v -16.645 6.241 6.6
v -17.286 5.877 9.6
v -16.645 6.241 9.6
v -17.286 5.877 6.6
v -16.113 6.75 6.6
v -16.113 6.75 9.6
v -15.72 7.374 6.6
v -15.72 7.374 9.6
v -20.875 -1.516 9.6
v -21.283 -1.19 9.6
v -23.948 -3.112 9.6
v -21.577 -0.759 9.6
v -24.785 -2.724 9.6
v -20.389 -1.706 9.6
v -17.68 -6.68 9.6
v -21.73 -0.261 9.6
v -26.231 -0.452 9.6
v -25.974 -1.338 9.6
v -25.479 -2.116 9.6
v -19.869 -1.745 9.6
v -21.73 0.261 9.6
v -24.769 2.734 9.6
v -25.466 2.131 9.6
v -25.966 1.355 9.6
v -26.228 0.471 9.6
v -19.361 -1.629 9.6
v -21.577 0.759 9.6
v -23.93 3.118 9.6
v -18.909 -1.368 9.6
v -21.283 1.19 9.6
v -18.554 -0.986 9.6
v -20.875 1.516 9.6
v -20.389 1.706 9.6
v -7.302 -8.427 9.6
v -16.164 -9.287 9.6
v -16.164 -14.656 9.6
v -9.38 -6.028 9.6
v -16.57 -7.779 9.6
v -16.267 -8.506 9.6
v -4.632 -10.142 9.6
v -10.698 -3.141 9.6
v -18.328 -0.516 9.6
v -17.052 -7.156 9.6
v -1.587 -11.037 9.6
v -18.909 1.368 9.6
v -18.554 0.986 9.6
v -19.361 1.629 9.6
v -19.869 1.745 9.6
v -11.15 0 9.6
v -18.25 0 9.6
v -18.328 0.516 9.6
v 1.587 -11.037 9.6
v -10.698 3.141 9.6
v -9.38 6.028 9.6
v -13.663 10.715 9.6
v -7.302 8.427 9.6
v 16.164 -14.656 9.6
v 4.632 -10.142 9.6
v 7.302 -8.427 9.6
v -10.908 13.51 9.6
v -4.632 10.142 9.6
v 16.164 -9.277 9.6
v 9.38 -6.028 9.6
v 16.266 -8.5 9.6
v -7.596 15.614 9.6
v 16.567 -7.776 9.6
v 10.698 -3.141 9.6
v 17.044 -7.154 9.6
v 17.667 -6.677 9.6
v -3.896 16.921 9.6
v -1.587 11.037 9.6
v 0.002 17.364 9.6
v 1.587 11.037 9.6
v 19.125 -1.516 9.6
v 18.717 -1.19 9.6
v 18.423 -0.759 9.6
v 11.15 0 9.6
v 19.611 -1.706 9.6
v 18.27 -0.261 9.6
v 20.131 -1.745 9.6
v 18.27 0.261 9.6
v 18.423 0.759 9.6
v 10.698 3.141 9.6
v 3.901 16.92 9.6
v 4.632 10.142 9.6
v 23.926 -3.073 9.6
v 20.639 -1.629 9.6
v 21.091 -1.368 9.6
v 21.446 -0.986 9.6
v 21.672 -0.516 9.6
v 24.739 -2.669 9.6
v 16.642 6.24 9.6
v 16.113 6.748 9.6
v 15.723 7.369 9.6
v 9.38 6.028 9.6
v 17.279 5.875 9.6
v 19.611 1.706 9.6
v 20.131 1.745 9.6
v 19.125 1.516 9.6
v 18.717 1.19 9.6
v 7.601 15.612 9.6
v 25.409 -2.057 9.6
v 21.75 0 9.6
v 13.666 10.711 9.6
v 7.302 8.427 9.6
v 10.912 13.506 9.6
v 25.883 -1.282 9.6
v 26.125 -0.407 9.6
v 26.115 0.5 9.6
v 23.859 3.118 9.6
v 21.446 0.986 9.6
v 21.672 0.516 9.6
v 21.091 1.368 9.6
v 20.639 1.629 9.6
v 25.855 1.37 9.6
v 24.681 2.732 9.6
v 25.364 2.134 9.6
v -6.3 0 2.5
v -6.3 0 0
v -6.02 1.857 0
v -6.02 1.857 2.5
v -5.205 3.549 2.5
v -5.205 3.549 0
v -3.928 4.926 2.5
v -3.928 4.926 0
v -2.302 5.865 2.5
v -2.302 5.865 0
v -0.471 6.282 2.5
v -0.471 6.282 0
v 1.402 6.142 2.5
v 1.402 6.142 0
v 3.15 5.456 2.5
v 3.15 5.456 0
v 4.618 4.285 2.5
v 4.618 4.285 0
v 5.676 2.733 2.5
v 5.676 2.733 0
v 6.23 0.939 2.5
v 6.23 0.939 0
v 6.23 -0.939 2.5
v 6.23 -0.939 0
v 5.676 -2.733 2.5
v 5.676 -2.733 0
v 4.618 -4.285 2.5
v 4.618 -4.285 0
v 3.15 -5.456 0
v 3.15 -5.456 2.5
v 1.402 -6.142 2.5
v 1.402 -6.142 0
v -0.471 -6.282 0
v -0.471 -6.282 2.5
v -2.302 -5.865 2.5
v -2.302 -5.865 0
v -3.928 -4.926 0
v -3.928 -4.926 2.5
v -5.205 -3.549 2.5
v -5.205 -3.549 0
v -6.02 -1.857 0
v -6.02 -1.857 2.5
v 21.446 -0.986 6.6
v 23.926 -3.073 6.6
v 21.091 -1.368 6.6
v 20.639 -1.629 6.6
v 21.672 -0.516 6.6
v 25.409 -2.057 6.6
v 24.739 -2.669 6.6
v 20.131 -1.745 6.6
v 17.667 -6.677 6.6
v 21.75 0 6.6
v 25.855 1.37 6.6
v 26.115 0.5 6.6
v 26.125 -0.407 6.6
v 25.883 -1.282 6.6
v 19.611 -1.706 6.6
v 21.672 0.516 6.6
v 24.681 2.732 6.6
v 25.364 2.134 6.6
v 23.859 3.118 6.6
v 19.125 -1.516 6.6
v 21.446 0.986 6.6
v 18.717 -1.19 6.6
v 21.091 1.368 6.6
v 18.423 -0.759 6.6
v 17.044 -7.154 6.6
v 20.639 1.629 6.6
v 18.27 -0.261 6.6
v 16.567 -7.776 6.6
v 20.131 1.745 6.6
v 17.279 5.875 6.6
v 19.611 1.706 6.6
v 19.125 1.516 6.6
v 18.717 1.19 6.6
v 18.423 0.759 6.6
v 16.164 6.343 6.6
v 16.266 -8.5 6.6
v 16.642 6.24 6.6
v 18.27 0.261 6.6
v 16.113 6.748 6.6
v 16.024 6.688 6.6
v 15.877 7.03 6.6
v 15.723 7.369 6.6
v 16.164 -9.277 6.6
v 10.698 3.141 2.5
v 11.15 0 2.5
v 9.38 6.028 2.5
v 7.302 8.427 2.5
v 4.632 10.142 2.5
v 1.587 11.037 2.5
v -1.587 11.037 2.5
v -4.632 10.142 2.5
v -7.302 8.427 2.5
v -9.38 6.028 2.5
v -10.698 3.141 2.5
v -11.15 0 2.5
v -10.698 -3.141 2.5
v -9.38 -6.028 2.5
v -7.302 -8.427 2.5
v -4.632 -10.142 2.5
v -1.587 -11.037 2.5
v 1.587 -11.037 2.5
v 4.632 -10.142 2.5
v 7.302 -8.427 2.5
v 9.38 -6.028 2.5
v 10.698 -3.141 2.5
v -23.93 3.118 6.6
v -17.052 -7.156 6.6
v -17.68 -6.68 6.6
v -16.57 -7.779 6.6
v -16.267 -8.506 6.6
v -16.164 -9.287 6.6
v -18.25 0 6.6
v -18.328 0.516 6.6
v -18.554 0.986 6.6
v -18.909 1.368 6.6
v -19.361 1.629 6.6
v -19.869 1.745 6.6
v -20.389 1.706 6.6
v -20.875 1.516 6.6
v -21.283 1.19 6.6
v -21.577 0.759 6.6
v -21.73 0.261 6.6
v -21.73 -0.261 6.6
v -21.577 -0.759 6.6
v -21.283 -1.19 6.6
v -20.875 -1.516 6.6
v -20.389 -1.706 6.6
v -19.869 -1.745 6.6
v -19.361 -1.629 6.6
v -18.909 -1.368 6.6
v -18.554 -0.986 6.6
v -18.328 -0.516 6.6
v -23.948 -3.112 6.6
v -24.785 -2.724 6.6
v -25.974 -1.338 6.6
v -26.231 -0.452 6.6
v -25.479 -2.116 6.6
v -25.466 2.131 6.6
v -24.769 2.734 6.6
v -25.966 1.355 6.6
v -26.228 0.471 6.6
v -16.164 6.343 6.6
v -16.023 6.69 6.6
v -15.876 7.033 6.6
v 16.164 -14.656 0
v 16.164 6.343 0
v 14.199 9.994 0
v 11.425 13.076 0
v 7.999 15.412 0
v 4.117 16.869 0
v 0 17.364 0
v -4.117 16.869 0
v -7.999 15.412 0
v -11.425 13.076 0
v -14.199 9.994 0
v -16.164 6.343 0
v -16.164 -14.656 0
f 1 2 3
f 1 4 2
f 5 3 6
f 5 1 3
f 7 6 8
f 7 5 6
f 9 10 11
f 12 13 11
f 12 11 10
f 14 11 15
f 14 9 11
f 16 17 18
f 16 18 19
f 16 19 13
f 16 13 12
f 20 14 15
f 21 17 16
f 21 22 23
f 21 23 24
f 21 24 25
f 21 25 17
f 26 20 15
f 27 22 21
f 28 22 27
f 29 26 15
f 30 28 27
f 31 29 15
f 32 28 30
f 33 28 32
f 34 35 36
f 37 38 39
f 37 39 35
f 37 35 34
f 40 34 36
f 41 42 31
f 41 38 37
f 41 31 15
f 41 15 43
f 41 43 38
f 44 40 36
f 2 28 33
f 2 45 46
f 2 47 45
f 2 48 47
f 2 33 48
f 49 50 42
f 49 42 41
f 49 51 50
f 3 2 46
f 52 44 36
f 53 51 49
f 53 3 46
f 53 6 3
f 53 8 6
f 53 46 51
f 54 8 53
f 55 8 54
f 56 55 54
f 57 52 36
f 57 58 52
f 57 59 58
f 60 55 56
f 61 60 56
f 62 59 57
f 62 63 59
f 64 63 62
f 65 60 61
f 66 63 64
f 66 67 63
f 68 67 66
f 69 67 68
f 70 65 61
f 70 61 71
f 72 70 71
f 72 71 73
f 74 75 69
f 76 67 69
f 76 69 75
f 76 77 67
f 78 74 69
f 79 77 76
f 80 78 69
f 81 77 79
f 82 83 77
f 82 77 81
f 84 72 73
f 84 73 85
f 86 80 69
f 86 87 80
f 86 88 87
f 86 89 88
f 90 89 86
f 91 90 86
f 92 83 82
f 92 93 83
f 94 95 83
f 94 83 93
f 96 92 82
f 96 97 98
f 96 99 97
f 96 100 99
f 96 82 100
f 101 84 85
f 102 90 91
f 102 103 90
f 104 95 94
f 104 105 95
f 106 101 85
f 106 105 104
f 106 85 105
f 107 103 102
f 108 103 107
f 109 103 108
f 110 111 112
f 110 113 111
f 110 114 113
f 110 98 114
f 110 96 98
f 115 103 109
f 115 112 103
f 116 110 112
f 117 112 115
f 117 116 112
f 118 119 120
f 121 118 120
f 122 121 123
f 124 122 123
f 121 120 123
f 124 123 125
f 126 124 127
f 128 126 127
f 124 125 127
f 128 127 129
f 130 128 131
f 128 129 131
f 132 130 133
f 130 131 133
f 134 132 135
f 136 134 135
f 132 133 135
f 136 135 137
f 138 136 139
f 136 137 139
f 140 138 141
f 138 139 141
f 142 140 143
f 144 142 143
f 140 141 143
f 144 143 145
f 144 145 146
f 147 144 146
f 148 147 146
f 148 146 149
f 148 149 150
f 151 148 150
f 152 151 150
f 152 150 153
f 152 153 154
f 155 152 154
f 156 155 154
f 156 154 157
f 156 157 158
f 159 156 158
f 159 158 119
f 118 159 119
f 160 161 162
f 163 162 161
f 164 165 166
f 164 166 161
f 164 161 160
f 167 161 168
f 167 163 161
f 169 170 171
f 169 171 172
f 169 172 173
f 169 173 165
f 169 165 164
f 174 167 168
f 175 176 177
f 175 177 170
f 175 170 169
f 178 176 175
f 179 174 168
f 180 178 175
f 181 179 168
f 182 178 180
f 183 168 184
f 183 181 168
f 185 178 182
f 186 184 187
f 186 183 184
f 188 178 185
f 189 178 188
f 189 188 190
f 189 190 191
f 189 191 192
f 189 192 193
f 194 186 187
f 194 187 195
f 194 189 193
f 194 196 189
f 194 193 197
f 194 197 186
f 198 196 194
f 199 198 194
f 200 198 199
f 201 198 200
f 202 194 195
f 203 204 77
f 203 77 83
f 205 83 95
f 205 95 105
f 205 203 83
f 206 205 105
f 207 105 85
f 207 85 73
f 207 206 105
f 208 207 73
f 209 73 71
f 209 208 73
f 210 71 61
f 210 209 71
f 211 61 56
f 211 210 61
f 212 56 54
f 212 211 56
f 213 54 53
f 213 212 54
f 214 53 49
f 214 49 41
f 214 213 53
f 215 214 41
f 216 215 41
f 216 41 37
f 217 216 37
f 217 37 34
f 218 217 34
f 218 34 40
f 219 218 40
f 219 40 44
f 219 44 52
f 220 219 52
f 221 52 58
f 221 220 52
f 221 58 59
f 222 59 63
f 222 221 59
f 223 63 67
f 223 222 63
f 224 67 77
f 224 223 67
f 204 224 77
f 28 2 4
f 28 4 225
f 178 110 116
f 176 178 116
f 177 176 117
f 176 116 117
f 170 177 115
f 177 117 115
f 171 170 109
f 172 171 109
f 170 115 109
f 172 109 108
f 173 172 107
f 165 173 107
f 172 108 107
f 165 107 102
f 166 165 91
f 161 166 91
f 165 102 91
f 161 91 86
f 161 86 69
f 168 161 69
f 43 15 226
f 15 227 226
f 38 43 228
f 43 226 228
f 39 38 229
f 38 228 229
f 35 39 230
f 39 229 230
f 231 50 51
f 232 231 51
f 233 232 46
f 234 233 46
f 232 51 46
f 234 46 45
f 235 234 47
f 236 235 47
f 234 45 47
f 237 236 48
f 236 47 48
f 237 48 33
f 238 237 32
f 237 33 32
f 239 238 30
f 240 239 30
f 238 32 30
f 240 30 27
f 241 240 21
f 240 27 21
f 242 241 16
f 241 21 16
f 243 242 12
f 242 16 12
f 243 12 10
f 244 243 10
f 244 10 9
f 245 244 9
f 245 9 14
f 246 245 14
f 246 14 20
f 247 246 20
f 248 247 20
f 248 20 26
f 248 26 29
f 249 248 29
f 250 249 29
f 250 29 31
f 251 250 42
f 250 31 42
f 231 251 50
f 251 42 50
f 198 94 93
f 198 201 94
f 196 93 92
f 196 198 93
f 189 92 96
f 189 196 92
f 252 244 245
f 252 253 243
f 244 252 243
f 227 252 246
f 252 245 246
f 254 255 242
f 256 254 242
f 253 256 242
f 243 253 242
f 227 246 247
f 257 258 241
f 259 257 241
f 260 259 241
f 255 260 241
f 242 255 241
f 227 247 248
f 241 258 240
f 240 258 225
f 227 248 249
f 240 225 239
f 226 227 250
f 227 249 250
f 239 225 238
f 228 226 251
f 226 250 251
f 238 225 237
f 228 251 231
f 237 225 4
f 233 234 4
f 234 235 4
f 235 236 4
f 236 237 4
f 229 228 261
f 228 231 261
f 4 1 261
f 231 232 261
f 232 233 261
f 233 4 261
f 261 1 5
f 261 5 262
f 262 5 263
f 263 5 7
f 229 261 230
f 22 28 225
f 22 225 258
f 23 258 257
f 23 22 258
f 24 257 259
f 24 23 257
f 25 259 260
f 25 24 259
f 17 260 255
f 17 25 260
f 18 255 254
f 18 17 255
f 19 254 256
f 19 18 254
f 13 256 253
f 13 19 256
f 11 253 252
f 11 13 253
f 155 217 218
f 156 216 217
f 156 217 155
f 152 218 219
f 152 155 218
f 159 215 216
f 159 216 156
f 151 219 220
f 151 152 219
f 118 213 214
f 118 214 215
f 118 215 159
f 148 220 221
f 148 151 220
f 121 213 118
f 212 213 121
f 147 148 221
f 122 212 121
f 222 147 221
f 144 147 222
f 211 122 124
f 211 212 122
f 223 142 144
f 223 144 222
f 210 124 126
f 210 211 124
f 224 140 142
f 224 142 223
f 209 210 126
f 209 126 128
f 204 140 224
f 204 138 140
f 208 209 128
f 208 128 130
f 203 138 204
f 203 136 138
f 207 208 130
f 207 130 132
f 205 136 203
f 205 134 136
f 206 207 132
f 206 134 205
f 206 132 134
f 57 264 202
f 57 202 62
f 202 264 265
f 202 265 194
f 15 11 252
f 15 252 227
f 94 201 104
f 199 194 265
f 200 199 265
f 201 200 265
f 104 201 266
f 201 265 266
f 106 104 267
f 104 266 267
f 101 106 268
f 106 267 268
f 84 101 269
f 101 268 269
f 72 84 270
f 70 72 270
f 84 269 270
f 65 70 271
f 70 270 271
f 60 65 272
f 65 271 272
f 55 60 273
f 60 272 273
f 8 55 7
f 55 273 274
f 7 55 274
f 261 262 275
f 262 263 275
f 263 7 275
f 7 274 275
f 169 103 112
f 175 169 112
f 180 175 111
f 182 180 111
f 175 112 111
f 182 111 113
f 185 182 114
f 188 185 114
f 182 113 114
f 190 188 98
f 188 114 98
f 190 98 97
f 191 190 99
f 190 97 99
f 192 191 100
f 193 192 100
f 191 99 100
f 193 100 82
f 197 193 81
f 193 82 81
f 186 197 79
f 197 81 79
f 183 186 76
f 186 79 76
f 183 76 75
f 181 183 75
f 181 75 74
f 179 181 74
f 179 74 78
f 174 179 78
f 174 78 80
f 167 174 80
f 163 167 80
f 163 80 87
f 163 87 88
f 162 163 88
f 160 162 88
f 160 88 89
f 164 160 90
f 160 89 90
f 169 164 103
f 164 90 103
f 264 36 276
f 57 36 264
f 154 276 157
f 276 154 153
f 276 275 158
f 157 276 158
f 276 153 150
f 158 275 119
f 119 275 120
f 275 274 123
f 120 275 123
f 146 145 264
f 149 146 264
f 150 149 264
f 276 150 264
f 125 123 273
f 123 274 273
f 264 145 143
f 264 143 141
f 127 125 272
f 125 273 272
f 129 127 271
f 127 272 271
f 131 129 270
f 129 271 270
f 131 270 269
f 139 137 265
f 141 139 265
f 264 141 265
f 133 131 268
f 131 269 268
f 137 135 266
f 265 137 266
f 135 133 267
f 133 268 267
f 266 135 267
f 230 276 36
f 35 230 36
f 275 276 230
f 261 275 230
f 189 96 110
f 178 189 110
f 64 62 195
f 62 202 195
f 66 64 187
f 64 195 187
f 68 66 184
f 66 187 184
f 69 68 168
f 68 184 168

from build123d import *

# Parameters (mm, degrees)
BOSS_EXTRUDE1_DEPTH = 2.5
BOSS_EXTRUDE2_DEPTH = 7.1
SKETCH6_R           = 1.7500000000000002
BOSS_EXTRUDE3_DEPTH = 3
FILLET1_R           = 3
CUT_EXTRUDE2_REACH  = 36.039
SKETCH7_R           = 6.300000000000017
CUT_EXTRUDE5_DEPTH  = 35.03920514623224
SKETCH9_R           = 11.15
BOSS_EXTRUDE4_DEPTH = 7.1
SKETCH10_W          = 32.327700987119805
SKETCH10_H          = 9.6
BOSS_EXTRUDE5_DEPTH = 2


with BuildPart() as part:
    # Sketch2 → Boss-Extrude1 (new body)
    with BuildSketch(Plane.XY):
        with BuildLine():
            Line((-16.1638504935599, 6.342967853027763), (-16.1638504935599, -14.391495343403756))
            Line((-16.1638504935599, -14.391495343403756), (-14.353897968517204, -14.640433541189916))
            Line((-14.353897968517204, -14.640433541189916), (-10.527602773342224, -17.52375378240297))
            Line((-10.527602773342224, -17.52375378240297), (-10.527602773341918, -19.404011272479938))
            Line((-10.527602773341918, -19.404011272479938), (-5.00712834909531, -19.40401127247995))
            Line((-5.00712834909531, -19.40401127247995), (-5.00712834909531, -17.50759675782326))
            Line((-5.00712834909531, -17.50759675782326), (5.000000000000001, -17.50759675782326))
            Line((5.000000000000001, -17.50759675782326), (5.000000000000002, -19.411447251383162))
            Line((5.000000000000002, -19.411447251383162), (10.46723706743368, -19.411447251383162))
            Line((10.46723706743368, -19.411447251383162), (10.46723706743368, -17.567178369014574))
            Line((10.46723706743368, -17.567178369014574), (14.33922382003656, -14.649427069646295))
            Line((14.33922382003656, -14.649427069646295), (16.163850493559902, -14.424396196711085))
            Line((16.163850493559902, -14.424396196711085), (16.163850493559902, 6.3429678530277736))
            ThreePointArc((16.163850493559902, 6.3429678530277736), (11.492625638566038, 13.016253681243118), (4.292170886786073, 16.82499845590859))
            ThreePointArc((4.292170886786073, 16.82499845590859), (-5.6e-16, 17.363850493559898), (-4.292170886786075, 16.824998455908585))
            ThreePointArc((-4.292170886786075, 16.824998455908585), (-11.492625638566041, 13.016253681243107), (-16.1638504935599, 6.342967853027763))
        make_face()
    extrude(amount=BOSS_EXTRUDE1_DEPTH)

    # Sketch3 → Boss-Extrude2 (add)
    with BuildSketch(Plane.XY.offset(2.5)):
        with BuildLine():
            Line((-16.163850493559902, 6.342967853027761), (-16.1638504935599, -14.391495343403756))
            Line((-16.1638504935599, -14.391495343403756), (-14.353897968517204, -14.640433541189916))
            Line((-14.353897968517204, -14.640433541189916), (-10.527602773342224, -17.52375378240297))
            Line((-10.527602773342224, -17.52375378240297), (-10.527602773341918, -19.404011272479938))
            Line((-10.527602773341918, -19.404011272479938), (-5.00712834909531, -19.40401127247995))
            Line((-5.00712834909531, -19.40401127247995), (-5.00712834909531, -17.50759675782326))
            Line((-5.00712834909531, -17.50759675782326), (5.000000000000001, -17.50759675782326))
            Line((5.000000000000001, -17.50759675782326), (5.000000000000002, -19.411447251383162))
            Line((5.000000000000002, -19.411447251383162), (10.46723706743368, -19.411447251383162))
            Line((10.46723706743368, -19.411447251383162), (10.46723706743368, -17.567178369014574))
            Line((10.46723706743368, -17.567178369014574), (14.33922382003656, -14.649427069646295))
            Line((14.33922382003656, -14.649427069646295), (16.163850493559902, -14.424396196711085))
            Line((16.163850493559902, -14.424396196711085), (16.1638504935599, 6.342967853027773))
            ThreePointArc((16.1638504935599, 6.342967853027773), (-6.65e-15, 17.363850493559898), (-16.163850493559902, 6.342967853027761))
        make_face()
        with BuildLine():
            Line((-14.363850493559898, 5.992765737499147), (-14.363850493559898, -12.822119287624734))
            Line((-14.363850493559898, -12.822119287624734), (-13.644664568054253, -12.921035057895738))
            Line((-13.644664568054253, -12.921035057895738), (-8.72760277334237, -16.626306887906704))
            Line((-8.72760277334237, -16.626306887906704), (-8.72760277334221, -17.60401127247994))
            Line((-8.72760277334221, -17.60401127247994), (-6.80712834909531, -17.604011272479944))
            Line((-6.80712834909531, -17.604011272479944), (-6.80712834909531, -15.707596757823262))
            Line((-6.80712834909531, -15.707596757823262), (6.800000000000001, -15.707596757823262))
            Line((6.800000000000001, -15.707596757823262), (6.800000000000002, -17.611447251383158))
            Line((6.800000000000002, -17.611447251383158), (8.667237067433682, -17.611447251383158))
            Line((8.667237067433682, -17.611447251383158), (8.667237067433682, -16.6697314745184))
            Line((8.667237067433682, -16.6697314745184), (13.640731753403138, -12.921934410741372))
            Line((13.640731753403138, -12.921934410741372), (14.3638504935599, -12.832752309167102))
            Line((14.3638504935599, -12.832752309167102), (14.3638504935599, 5.99276573749915))
            ThreePointArc((14.3638504935599, 5.99276573749915), (10.460467666070398, 11.524411411997598), (4.577751284666915, 14.875403704155904))
            ThreePointArc((4.577751284666915, 14.875403704155904), (-2.56e-15, 15.563850493559903), (-4.577751284666914, 14.8754037041559))
            ThreePointArc((-4.577751284666914, 14.8754037041559), (-10.460467666070397, 11.524411411997596), (-14.363850493559898, 5.992765737499147))
        make_face(mode=Mode.SUBTRACT)
    extrude(amount=BOSS_EXTRUDE2_DEPTH)

    # Sketch6 → Boss-Extrude3 (add)
    # profile 1 of 2: a face of its own
    with BuildSketch(Plane.XY.offset(9.6)):
        with BuildLine():
            Line((-16.163850493559902, -7.542701658313458), (-16.163850493559902, 6.342967853027761))
            Line((-16.163850493559902, 6.342967853027761), (-23.929756214170595, 3.117786469903069))
            ThreePointArc((-23.929756214170595, 3.117786469903069), (-26.262186338368657, 0.00976998259598626), (-23.948484603893608, -3.1122135300969274))
            Line((-23.948484603893608, -3.1122135300969274), (-16.163850493559902, -7.542701658313458))
        make_face()
        with Locations((-20, 0)):
            Circle(SKETCH6_R, mode=Mode.SUBTRACT)
    # profile 2 of 2: a face of its own
    with BuildSketch(Plane.XY.offset(9.6)):
        with BuildLine():
            Line((16.163850493559902, -7.542701658313497), (16.163850493559902, 6.3429678530277736))
            Line((16.163850493559902, 6.3429678530277736), (23.859195056542305, 3.1177864699030087))
            ThreePointArc((23.859195056542305, 3.1177864699030087), (26.152039317100943, 0.04687299892404297), (23.92587050194897, -3.072712992175038))
            Line((23.92587050194897, -3.072712992175038), (16.163850493559902, -7.542701658313497))
        make_face()
        with Locations((20, 0)):
            Circle(SKETCH6_R, mode=Mode.SUBTRACT)
    extrude(amount=-BOSS_EXTRUDE3_DEPTH)

    # Fillet1
    fillet1_edges = [part.edges().sort_by_distance(p)[0] for p in [
        (16.163850493559902, -7.542701658313497, 8.1),
        (-16.163850493559902, -7.542701658313458, 8.1),
        (16.1638504935599, 6.342967853027773, 8.1),
        (-16.163850493559902, 6.342967853027762, 8.1),
    ]]
    fillet(fillet1_edges, radius=FILLET1_R)

    # Sketch7 → Cut-Extrude2 (cut, up to next)
    with BuildSketch(Plane(origin=(0, 0, 0), x_dir=(-1, 0, 0), z_dir=(0, 0, -1)), mode=Mode.PRIVATE) as cut_extrude2_sk1:
        Circle(SKETCH7_R)
    cut_extrude2_tool1 = extrude(cut_extrude2_sk1.sketch, amount=-CUT_EXTRUDE2_REACH, mode=Mode.PRIVATE) & part.part
    add(cut_extrude2_tool1.solids().sort_by_distance((0, 0, 0))[0], mode=Mode.SUBTRACT)

    # Sketch4 → Cut-Extrude5 (cut, through all)
    with BuildSketch(Plane(origin=(0, 0, 9.6), x_dir=(-1, 0, 0), z_dir=(0, 0, -1))):
        Polygon((-16.163850493559902, -12.655902988328881), (17.617388614013404, -12.655902988328881), (17.617388614013407, -23.466434072446418), (-16.163850493559902, -23.466434072446418), align=None)
    extrude(amount=CUT_EXTRUDE5_DEPTH, mode=Mode.SUBTRACT)

    # Sketch9 → Boss-Extrude4 (add)
    with BuildSketch(Plane.XY.offset(2.5)):
        with BuildLine():
            Line((-14.363850493559875, 5.992765737499137), (-14.363850493559898, -12.655902988328881))
            Line((-14.363850493559898, -12.655902988328881), (14.3638504935599, -12.655902988328881))
            Line((14.3638504935599, -12.655902988328881), (14.363850493559902, 5.992765737499152))
            ThreePointArc((14.363850493559902, 5.992765737499152), (9e-16, 15.563850493559924), (-14.363850493559875, 5.992765737499137))
        make_face()
        Circle(SKETCH9_R, mode=Mode.SUBTRACT)
    extrude(amount=BOSS_EXTRUDE4_DEPTH)

    # Sketch10 → Boss-Extrude5 (add)
    with BuildSketch(Plane.XZ.offset(12.655902988328881)):
        with Locations((0, 4.8)):
            Rectangle(SKETCH10_W, SKETCH10_H)
    extrude(amount=BOSS_EXTRUDE5_DEPTH)


solid = part.part
